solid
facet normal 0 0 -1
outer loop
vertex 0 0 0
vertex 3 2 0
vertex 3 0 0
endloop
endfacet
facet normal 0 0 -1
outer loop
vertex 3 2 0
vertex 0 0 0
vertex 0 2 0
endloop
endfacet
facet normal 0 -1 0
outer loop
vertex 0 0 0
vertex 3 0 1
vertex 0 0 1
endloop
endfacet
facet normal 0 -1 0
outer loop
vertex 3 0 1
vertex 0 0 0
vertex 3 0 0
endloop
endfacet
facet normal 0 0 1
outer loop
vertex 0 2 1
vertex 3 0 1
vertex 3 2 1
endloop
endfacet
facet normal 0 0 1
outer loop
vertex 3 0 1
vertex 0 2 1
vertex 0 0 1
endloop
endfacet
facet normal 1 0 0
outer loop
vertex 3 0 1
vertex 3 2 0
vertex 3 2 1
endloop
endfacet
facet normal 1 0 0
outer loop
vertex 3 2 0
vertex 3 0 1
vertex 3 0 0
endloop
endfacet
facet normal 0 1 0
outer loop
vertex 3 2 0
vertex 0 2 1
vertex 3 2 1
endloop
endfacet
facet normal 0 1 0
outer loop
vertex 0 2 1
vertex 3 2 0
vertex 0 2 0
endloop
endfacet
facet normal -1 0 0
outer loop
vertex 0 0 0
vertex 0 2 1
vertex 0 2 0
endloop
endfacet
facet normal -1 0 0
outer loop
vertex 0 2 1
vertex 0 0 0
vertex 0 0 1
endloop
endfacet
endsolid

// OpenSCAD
polyhedron(
    points=[[0,0,0], [3,0,0], [3,2,0], [0,2,0],
            [0,0,1], [3,0,1], [3,2,1], [0,2,1]],
    faces=[[0,1,2,3], [4,5,1,0], [7,6,5,4],
           [5,6,2,1], [6,7,3,2], [7,4,0,3]]
);
